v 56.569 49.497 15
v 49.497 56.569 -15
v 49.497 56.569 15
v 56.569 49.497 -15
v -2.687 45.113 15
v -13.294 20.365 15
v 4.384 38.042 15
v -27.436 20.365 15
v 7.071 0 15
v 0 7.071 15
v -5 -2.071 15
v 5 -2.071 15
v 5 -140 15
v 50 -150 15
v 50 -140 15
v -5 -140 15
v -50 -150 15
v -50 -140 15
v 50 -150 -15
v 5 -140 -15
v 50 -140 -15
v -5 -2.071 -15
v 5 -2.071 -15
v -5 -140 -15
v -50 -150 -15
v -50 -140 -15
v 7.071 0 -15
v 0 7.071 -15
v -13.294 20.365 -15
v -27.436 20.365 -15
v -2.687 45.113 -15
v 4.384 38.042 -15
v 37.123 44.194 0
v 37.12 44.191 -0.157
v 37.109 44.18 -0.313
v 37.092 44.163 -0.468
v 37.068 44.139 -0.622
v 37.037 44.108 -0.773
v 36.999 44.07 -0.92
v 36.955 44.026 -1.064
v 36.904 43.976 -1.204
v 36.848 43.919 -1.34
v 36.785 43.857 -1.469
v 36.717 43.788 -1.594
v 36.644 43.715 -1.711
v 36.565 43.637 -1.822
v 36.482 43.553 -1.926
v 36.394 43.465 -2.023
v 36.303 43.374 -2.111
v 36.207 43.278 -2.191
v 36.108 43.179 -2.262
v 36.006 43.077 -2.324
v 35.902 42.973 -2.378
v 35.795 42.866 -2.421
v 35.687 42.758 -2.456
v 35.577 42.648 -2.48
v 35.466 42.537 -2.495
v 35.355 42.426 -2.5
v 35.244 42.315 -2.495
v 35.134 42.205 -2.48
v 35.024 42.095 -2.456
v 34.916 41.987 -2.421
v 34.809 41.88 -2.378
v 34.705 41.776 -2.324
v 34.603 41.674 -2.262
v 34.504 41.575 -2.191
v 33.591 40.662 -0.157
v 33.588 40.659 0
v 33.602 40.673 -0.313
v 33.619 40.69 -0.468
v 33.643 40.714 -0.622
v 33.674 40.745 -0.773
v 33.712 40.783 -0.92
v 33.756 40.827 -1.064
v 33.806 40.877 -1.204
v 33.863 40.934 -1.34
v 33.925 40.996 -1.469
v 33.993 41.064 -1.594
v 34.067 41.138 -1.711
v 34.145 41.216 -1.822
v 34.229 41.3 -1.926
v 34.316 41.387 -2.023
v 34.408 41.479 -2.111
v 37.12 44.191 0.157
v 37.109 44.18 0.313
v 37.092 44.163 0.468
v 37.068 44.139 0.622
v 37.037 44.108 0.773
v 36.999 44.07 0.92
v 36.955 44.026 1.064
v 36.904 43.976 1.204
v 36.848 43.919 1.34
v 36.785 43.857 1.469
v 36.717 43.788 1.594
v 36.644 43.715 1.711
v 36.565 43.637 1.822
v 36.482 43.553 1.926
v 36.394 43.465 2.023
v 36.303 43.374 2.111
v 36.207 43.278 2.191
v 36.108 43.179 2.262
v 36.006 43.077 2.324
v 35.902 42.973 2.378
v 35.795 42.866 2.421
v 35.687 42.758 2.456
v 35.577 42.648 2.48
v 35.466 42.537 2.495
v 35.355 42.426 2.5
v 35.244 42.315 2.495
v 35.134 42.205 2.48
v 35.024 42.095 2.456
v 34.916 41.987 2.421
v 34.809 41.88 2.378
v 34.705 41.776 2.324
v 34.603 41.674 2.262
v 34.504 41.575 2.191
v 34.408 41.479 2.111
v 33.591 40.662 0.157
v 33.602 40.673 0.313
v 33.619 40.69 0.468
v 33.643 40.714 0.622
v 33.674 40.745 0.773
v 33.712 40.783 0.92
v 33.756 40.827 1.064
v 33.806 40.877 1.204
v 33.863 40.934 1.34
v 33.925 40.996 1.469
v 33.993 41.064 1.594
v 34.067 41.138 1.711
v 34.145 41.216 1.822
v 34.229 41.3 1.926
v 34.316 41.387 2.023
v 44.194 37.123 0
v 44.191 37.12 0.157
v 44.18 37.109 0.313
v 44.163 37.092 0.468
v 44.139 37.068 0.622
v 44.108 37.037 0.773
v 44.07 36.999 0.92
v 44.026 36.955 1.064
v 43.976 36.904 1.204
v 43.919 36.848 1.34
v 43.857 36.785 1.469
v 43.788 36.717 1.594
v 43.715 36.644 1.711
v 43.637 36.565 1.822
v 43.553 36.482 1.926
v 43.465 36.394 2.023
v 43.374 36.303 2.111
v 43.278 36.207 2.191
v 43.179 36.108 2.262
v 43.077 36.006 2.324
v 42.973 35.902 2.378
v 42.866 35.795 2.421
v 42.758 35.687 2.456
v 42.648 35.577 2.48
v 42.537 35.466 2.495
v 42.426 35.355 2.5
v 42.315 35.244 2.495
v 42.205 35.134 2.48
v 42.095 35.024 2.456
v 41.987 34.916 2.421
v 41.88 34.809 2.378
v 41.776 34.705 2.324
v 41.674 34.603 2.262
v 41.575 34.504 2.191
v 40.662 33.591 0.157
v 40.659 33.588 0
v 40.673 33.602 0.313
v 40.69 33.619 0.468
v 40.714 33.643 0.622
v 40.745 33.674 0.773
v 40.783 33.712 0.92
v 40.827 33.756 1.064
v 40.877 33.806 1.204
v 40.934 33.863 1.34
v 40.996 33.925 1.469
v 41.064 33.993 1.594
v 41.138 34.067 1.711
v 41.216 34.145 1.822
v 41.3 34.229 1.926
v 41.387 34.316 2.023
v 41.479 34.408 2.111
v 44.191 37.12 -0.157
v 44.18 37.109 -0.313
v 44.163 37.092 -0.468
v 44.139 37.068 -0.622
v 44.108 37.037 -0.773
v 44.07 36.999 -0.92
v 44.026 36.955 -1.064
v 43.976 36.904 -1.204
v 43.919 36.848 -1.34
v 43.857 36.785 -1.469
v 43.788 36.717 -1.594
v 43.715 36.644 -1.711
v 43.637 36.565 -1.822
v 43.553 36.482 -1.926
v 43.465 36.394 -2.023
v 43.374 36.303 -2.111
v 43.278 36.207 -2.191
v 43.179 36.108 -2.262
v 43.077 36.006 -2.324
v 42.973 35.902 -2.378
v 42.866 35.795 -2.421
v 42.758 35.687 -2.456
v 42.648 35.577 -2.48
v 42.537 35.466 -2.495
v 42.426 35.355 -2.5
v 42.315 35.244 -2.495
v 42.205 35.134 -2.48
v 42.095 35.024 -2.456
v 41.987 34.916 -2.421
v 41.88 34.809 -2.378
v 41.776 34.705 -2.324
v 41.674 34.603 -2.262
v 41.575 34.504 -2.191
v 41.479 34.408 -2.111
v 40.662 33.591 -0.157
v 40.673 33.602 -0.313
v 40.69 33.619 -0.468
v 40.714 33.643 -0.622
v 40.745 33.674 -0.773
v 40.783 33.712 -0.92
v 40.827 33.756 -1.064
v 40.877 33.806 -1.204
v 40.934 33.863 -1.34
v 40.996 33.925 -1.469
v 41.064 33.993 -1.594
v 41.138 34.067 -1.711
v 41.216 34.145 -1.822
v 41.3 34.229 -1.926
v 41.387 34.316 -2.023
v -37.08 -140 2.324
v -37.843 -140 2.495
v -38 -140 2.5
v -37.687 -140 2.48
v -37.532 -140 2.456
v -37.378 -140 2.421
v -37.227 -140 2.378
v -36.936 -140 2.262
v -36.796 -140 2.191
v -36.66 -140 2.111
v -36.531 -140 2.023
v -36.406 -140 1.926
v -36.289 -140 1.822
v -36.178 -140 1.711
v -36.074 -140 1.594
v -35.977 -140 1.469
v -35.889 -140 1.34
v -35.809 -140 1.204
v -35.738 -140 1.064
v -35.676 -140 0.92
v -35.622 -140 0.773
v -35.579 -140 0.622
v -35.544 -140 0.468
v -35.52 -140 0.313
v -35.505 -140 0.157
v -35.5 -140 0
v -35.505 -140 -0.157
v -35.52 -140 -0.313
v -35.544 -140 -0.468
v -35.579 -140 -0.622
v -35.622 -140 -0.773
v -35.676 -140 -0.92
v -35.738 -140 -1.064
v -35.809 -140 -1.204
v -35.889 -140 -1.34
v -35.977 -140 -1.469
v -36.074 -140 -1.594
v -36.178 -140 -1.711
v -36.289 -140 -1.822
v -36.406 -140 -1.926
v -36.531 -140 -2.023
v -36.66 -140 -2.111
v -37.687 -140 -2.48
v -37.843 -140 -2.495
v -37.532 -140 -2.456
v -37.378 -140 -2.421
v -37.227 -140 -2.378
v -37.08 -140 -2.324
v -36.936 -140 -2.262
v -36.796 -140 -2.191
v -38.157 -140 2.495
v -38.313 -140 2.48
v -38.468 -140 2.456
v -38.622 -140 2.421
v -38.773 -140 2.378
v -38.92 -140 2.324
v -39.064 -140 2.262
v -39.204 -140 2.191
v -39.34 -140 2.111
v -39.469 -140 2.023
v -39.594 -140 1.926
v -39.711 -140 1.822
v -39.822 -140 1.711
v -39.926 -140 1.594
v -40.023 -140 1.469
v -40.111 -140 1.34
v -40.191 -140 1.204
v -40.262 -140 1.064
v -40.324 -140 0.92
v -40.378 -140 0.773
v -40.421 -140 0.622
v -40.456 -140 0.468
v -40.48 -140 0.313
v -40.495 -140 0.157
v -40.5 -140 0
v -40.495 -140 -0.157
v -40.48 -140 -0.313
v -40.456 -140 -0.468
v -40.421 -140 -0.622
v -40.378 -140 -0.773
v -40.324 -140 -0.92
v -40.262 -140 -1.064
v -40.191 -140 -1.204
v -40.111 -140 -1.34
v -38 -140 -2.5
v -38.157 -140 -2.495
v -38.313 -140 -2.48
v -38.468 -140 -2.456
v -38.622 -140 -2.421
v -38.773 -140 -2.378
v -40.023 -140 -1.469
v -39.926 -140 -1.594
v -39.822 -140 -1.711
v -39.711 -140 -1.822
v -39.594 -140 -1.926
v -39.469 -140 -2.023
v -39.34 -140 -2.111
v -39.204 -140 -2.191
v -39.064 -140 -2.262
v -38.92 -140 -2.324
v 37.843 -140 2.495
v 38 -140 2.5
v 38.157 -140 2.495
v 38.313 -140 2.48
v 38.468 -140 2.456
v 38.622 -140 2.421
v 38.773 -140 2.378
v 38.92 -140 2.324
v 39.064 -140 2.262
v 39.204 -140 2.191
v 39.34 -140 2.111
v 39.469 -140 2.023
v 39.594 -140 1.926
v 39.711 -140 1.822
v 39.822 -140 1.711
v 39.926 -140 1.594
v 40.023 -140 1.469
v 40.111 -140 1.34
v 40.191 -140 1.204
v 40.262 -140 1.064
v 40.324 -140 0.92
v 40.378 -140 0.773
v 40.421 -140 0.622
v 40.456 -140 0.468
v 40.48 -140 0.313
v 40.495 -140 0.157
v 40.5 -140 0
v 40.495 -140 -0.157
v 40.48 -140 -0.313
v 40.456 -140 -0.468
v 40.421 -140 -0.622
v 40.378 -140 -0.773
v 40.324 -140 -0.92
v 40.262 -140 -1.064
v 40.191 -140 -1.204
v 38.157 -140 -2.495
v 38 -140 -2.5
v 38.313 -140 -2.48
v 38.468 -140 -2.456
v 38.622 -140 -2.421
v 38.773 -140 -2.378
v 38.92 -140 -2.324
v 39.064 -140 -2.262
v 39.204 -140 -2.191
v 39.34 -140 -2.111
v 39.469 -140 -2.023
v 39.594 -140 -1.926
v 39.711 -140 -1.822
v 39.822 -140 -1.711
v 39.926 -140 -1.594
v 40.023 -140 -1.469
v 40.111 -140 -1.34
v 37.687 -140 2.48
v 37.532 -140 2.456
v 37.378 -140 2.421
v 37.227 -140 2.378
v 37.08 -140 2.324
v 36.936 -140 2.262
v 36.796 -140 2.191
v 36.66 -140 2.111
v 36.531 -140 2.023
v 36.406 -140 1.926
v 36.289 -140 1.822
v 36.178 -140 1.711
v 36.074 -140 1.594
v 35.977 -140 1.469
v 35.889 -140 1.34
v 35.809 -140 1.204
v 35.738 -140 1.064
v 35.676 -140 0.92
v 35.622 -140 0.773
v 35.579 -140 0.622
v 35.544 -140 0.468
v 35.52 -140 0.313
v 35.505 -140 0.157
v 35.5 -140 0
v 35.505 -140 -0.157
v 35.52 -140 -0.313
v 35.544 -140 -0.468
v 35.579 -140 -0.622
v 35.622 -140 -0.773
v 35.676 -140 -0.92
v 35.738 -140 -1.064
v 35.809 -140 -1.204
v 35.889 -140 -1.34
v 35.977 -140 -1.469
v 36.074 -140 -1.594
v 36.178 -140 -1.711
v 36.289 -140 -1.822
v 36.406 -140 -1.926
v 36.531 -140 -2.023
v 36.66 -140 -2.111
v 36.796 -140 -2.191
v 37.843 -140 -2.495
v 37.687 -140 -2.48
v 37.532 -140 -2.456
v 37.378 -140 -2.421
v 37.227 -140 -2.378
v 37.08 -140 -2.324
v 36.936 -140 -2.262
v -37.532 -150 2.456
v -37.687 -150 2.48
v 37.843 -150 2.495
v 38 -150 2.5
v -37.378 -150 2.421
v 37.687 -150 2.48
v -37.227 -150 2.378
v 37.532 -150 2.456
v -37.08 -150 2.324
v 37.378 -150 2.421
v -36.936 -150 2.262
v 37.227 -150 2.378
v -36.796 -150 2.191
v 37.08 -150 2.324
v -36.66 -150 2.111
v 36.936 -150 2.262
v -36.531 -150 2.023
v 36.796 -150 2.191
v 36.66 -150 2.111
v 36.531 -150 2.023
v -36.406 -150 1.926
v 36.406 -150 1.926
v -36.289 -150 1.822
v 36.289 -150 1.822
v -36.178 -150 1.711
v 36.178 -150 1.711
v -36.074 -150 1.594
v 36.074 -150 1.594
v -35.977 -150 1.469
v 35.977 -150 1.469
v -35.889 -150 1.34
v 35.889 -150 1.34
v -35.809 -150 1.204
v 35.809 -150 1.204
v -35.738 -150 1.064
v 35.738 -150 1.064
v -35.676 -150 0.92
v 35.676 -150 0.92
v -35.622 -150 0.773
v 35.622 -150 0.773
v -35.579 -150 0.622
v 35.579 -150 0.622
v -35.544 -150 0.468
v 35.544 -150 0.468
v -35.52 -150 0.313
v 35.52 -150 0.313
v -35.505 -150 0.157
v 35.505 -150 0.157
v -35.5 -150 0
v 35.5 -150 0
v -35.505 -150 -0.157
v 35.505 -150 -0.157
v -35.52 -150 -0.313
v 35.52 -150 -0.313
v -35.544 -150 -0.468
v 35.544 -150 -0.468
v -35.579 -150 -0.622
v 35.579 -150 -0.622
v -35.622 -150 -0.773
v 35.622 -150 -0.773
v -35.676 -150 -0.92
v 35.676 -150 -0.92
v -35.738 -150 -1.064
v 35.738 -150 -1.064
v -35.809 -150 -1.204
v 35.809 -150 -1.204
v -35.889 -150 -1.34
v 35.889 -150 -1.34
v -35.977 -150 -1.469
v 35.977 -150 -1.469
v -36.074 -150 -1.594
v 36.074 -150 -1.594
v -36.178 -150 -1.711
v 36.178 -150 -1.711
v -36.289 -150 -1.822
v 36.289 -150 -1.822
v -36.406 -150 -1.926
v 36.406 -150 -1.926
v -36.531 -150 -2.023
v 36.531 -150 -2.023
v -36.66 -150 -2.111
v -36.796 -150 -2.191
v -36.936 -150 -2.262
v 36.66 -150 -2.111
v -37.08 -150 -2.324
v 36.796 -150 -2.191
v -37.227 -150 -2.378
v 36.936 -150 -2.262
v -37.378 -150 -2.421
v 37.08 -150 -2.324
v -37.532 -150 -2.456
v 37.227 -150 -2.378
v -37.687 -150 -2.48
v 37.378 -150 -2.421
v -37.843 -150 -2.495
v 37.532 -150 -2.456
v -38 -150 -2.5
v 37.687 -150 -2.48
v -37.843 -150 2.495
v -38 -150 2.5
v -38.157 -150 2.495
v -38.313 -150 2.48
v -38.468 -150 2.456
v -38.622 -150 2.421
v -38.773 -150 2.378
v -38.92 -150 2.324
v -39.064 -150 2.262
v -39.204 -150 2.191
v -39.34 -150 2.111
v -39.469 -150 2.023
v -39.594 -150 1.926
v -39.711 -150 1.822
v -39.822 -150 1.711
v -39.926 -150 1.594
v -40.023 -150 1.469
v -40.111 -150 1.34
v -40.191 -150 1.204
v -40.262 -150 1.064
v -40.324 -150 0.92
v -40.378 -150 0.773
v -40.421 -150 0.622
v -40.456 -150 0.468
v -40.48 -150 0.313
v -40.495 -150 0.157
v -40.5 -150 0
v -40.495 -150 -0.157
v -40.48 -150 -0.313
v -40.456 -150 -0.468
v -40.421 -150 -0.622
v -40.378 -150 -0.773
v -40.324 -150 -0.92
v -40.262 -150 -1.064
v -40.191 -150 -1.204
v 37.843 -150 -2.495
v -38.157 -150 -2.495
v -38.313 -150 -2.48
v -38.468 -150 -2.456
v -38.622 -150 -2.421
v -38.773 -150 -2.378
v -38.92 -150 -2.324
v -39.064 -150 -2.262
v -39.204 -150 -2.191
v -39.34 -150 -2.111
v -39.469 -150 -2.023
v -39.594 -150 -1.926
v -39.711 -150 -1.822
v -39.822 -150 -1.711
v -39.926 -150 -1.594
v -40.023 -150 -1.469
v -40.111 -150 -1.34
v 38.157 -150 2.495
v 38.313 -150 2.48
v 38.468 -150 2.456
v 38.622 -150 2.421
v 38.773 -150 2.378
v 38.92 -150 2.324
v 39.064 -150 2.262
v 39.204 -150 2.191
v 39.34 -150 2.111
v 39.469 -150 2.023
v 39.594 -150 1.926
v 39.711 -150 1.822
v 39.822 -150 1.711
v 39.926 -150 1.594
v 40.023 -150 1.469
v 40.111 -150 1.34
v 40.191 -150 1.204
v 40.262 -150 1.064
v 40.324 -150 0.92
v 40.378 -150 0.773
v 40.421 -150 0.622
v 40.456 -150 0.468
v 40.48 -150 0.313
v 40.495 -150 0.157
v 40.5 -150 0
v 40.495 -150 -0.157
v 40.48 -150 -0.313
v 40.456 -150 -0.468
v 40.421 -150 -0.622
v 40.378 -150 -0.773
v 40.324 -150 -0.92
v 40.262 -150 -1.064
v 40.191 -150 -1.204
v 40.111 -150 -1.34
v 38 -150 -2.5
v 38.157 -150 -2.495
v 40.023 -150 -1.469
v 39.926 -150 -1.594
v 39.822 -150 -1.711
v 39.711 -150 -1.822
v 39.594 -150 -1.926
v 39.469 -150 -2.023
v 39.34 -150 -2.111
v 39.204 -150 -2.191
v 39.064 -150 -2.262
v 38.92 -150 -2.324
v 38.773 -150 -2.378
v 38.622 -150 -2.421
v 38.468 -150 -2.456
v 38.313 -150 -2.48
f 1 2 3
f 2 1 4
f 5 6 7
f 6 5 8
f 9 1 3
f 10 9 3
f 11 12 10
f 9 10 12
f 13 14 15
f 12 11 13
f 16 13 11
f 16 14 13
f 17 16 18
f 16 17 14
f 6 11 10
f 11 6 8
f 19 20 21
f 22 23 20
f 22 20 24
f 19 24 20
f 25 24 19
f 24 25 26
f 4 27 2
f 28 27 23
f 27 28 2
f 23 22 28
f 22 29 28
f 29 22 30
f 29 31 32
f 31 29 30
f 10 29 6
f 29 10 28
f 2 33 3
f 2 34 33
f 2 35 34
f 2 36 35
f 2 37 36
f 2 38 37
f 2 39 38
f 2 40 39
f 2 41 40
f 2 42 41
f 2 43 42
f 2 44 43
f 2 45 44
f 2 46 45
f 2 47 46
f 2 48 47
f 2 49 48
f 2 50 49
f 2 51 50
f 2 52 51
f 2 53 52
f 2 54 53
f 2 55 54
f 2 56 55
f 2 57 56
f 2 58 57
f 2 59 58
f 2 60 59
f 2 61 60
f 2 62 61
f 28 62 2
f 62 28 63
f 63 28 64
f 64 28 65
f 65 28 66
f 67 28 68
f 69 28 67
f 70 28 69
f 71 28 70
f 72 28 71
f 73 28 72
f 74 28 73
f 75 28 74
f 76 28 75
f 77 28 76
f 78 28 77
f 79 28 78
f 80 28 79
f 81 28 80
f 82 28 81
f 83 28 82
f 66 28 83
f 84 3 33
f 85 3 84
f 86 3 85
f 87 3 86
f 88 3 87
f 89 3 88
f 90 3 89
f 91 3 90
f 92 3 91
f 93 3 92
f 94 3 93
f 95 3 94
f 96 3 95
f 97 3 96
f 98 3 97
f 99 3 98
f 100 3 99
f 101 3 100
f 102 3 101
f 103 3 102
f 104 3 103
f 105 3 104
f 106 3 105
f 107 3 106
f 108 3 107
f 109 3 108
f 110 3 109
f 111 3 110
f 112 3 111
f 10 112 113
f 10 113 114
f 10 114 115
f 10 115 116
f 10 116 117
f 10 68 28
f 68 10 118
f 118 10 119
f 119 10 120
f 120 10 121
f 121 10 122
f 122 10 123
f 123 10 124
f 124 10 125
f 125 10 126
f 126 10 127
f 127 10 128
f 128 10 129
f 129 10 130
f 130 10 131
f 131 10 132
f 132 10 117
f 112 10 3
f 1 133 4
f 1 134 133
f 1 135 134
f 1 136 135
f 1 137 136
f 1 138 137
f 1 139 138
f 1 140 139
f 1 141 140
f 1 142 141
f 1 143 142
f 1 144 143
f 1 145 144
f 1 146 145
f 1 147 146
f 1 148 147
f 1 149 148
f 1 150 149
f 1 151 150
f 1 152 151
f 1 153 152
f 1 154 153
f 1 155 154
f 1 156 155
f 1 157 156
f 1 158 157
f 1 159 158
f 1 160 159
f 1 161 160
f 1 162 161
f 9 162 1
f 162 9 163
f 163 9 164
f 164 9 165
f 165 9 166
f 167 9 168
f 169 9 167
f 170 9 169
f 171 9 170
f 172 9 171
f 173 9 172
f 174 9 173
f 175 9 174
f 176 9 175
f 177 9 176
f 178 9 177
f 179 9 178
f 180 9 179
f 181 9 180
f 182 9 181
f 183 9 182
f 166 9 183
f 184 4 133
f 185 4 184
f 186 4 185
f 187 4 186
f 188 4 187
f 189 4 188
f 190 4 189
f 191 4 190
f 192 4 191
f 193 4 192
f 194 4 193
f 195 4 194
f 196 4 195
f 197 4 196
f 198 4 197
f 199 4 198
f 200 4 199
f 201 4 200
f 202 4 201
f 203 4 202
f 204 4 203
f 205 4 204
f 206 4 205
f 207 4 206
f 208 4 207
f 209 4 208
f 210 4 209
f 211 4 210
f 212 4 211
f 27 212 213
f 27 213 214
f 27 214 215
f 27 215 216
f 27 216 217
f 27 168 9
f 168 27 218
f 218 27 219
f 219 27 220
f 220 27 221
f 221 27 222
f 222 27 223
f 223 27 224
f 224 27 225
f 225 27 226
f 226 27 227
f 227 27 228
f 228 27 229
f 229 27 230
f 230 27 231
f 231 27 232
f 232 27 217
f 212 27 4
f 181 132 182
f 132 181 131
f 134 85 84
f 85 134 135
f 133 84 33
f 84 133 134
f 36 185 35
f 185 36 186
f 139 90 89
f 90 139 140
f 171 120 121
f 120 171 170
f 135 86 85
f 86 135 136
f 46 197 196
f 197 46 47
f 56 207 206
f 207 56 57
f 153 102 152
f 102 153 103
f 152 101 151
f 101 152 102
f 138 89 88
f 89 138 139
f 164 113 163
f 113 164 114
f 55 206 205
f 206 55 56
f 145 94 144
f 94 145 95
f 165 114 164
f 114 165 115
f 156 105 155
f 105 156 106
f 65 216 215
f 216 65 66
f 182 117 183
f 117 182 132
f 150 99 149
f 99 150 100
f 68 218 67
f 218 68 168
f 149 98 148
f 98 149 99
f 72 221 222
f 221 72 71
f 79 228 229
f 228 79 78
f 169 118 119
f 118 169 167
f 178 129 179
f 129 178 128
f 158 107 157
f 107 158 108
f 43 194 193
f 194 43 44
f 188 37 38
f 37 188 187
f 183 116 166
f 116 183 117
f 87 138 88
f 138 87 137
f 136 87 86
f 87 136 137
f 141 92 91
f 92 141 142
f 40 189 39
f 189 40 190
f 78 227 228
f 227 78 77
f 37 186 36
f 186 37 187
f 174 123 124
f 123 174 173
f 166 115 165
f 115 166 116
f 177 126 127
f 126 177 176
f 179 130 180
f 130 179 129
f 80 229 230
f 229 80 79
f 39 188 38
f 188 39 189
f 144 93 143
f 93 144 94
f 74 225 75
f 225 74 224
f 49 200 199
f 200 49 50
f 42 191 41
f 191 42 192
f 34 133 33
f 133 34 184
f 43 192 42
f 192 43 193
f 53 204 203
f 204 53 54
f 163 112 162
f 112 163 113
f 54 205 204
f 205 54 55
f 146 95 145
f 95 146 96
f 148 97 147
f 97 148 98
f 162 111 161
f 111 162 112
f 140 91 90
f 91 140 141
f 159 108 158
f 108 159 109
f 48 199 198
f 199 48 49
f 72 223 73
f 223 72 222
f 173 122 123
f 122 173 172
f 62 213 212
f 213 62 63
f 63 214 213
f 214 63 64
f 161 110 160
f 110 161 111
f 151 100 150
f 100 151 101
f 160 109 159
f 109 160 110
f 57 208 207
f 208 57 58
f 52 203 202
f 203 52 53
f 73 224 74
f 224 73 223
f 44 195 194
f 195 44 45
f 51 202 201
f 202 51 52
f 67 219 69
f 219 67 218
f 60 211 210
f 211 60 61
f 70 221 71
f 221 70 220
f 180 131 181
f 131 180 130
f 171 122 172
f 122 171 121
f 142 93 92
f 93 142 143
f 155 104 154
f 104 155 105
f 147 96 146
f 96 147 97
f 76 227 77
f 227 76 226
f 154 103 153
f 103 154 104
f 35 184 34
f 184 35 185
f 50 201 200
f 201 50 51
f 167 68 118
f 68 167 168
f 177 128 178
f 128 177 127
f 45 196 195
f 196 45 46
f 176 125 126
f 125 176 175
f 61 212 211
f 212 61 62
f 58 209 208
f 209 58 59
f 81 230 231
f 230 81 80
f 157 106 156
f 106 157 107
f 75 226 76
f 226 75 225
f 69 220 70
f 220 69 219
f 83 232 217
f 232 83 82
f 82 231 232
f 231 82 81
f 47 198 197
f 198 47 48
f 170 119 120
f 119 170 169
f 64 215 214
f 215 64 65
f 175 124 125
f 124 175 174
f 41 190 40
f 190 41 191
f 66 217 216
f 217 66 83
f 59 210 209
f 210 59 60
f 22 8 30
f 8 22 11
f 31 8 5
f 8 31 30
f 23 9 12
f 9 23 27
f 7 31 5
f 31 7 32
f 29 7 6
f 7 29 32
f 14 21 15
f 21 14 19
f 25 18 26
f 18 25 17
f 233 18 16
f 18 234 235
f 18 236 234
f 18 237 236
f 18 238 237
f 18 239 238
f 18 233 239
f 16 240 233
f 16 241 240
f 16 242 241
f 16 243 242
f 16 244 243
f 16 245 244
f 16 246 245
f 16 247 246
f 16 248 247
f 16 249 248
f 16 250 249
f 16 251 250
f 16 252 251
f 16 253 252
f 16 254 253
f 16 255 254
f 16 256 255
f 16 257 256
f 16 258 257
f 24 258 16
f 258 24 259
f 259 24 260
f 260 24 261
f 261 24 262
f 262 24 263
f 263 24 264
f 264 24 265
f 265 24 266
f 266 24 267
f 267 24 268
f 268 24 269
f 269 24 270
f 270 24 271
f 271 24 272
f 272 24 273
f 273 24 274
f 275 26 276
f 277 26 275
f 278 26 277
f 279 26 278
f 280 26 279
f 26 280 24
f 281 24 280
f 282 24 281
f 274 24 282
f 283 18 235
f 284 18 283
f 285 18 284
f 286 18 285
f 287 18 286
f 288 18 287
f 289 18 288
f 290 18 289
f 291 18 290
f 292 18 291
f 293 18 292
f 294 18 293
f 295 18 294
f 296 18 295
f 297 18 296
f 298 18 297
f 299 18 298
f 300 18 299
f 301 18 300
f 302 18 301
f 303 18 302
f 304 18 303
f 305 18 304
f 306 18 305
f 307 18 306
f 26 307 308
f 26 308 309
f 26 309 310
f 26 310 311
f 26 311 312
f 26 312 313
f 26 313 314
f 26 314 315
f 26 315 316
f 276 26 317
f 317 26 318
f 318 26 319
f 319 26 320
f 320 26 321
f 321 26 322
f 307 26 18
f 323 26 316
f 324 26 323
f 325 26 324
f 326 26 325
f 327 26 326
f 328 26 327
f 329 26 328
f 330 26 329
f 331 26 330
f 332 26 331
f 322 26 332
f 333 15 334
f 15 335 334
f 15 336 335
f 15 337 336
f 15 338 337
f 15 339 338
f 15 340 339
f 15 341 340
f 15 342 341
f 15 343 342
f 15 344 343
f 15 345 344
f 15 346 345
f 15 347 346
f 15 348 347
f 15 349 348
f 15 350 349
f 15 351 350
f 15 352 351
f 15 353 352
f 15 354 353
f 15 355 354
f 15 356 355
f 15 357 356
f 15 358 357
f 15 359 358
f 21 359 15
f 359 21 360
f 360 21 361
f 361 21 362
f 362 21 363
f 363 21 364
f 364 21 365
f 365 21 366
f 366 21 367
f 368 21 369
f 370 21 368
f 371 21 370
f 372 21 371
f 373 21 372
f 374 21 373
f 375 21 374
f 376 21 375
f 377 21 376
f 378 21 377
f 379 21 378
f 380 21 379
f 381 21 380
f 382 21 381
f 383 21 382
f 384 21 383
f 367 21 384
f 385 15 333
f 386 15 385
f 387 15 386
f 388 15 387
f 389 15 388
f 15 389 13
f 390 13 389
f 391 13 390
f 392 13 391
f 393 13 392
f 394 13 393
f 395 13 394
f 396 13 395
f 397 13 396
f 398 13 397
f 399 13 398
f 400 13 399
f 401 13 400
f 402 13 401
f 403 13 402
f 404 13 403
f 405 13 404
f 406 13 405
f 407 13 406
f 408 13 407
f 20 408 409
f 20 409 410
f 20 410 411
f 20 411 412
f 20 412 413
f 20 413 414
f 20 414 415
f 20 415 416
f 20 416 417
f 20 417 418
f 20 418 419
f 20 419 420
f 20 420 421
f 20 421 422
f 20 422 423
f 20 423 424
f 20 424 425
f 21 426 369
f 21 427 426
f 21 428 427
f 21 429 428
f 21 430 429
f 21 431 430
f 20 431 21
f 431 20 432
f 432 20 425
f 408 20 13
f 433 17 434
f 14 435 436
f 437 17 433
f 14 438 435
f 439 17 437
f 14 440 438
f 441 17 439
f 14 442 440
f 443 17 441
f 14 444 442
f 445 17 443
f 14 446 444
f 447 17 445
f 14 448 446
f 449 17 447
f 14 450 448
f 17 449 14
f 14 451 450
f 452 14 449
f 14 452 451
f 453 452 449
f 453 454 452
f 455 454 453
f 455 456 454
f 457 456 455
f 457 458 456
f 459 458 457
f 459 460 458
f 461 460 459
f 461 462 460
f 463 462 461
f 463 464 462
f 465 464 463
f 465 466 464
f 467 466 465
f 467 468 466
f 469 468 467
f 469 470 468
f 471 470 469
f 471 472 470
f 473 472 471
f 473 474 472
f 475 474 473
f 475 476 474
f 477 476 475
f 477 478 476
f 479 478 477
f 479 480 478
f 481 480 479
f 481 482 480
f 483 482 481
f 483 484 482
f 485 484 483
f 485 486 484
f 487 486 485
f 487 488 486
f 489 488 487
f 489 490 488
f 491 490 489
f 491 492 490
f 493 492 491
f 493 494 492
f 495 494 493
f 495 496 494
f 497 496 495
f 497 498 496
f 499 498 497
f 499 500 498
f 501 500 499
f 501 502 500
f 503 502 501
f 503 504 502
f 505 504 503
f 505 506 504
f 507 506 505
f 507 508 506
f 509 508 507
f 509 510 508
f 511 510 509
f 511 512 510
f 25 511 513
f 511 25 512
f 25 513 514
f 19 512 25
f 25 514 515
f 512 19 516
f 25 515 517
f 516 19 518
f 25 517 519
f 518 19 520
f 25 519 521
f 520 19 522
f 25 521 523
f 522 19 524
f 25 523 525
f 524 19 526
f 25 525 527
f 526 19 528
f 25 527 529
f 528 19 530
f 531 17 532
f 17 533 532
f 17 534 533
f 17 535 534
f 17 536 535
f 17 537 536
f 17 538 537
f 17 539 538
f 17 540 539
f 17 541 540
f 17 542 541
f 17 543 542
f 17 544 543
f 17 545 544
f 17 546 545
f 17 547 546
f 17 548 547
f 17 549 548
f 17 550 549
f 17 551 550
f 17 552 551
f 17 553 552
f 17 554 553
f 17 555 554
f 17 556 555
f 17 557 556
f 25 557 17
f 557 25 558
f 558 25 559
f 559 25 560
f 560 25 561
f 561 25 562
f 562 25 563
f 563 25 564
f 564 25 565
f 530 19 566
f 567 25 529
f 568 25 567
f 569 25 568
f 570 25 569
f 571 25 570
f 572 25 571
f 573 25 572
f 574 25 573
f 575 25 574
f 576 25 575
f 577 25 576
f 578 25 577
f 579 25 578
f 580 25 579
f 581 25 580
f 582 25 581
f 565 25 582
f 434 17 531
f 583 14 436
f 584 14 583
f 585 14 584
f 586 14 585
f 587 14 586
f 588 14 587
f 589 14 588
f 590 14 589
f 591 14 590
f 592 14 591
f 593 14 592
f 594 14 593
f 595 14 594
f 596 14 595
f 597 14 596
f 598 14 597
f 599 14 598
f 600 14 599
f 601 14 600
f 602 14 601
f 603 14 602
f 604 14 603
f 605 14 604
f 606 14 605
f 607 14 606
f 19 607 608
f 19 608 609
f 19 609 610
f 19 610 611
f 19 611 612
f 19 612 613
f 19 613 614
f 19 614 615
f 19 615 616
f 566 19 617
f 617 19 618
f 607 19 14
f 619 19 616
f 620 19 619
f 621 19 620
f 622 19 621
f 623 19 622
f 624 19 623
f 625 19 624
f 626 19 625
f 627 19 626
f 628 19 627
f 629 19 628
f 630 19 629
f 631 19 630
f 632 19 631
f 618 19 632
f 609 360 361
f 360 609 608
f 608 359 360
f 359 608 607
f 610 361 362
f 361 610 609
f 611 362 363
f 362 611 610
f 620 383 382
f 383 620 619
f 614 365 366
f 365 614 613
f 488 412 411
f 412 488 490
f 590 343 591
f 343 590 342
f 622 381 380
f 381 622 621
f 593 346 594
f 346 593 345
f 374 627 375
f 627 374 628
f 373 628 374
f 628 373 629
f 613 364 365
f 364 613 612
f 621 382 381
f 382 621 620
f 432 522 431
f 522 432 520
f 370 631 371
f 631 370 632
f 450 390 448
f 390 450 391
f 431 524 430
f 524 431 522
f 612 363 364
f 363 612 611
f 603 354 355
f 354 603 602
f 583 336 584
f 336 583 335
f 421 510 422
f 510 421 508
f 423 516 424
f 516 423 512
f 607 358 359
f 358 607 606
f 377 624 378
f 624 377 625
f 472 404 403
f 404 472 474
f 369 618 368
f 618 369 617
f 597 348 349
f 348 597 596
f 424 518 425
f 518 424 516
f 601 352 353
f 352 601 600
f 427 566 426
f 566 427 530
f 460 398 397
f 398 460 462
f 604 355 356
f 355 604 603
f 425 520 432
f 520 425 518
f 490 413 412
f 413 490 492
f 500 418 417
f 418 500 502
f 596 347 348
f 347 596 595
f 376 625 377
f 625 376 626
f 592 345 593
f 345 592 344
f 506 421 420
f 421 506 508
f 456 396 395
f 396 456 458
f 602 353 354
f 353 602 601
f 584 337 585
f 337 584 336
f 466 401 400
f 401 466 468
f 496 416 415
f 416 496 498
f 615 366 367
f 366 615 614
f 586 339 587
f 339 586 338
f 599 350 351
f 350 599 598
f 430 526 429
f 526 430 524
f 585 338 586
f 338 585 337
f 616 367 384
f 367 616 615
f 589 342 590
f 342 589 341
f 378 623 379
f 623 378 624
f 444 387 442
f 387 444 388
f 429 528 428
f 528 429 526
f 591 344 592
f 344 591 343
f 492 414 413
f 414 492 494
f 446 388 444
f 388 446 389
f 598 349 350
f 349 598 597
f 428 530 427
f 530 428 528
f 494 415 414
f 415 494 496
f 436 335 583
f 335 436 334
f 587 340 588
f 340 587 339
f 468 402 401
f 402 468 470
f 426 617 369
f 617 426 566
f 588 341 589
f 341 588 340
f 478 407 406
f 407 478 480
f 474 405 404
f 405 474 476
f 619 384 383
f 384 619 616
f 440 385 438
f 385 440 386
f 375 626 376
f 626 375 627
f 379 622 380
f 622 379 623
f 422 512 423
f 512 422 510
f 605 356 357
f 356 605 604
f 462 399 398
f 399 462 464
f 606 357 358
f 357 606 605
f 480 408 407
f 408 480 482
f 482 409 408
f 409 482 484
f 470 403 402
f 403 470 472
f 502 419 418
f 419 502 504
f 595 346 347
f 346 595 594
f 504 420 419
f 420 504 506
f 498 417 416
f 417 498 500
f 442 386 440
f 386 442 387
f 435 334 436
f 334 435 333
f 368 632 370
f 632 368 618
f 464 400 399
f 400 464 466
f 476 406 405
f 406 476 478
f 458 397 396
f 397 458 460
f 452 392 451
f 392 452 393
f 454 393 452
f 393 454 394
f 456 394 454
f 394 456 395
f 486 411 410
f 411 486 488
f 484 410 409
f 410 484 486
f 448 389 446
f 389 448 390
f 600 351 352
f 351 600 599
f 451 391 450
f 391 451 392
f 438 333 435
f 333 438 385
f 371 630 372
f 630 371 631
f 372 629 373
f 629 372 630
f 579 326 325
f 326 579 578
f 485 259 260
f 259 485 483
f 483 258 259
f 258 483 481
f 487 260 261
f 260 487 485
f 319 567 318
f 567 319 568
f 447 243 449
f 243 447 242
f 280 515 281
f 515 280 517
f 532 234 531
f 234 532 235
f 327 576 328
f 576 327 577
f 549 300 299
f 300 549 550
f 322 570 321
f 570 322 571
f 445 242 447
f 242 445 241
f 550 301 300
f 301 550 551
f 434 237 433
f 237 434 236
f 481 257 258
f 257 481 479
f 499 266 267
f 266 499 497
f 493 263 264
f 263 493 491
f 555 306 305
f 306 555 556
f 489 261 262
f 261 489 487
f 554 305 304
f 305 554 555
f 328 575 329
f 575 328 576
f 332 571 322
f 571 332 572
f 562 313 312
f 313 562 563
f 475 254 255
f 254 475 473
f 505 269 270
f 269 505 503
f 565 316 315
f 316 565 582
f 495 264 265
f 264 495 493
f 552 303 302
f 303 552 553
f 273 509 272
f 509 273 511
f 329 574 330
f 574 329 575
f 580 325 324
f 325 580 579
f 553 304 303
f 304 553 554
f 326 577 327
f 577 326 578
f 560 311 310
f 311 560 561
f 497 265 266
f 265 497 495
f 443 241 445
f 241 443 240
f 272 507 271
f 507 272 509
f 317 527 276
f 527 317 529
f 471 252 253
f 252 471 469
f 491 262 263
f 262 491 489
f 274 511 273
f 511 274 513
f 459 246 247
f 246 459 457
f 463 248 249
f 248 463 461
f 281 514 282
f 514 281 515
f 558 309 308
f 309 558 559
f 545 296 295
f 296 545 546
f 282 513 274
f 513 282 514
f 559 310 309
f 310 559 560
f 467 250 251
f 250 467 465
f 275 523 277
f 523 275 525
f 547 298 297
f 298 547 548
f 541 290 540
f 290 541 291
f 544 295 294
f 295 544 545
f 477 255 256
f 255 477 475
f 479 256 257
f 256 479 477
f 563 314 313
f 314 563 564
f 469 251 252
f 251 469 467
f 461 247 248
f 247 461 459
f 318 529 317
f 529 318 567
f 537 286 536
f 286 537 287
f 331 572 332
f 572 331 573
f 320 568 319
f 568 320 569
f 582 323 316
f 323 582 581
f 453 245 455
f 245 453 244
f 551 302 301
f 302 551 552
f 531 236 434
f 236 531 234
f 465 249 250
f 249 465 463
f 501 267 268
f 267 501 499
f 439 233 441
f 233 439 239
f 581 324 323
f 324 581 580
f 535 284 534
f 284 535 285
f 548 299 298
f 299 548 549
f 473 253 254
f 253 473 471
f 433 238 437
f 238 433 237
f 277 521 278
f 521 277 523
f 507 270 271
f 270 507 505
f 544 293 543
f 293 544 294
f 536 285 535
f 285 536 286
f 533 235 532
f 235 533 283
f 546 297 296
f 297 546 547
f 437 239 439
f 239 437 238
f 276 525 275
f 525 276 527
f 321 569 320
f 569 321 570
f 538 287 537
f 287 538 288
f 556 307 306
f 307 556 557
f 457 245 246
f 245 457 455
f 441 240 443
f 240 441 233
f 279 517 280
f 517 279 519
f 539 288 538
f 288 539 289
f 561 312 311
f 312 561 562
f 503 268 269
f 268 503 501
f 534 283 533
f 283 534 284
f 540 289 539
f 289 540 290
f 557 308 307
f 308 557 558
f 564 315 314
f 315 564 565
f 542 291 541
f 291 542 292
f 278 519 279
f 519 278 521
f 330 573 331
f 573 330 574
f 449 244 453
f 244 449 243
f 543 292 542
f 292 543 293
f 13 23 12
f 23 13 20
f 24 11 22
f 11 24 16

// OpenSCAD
$fn=100;

wall_dist=150;
thickness=10;
width=80;
width2=100;
height=30;

screw_dia=4;
screw_dia2=5;
screw_head=8;
screw_offs=width/4*1.3;

screw_dist=76;

module screwhole()
{
  cylinder(d=screw_dia, h=thickness+1, center=true);
  translate([0, 0, thickness/2]) mirror([0, 0, 1]) cylinder(d2=0, d1=screw_head, h=screw_head*2/3, center=false);
}

module screwhole2()
{
  cylinder(d=screw_dia2, h=thickness+1, center=true);
  //translate([0, 0, thickness/2]) mirror([0, 0, 1]) cylinder(d2=0, d1=screw_head, h=screw_head*2/3, center=false);
}


//   FALI TARTO
//translate([0, -thickness/2], 0) difference()
//{
//  union()
//  {
//    cube([width, thickness, height], center=true);
//    translate([0, 0, width/2]) cube([height, thickness, width], center=true);
//  }
//  translate([screw_offs, 0, 0]) rotate([90, 0, 0]) screwhole();
//  translate([-screw_offs, 0, 0]) rotate([90, 0, 0]) screwhole();
//}

//   SZEKRENYHEZ ROGZITHETO
rotate([0, 0, 45])
{
  difference()
  {
    union()
    {
      translate([70/2+thickness/2, 0, 0]) cube([70, thickness, height], center=true);
      //translate([50/2+thickness/2, 0, 10]) cube([50, thickness, height], center=true);
      //cylinder(d=thickness, h=height, center=true);
    }
    translate([50+thickness/2, 0, 0]) rotate([90, 0, 0]) screwhole2();
  }
  translate([0, 18.8/2+thickness/2, 0]) cube([thickness, 18.8+thickness*2, height], center=true);
  translate([10+thickness/2, 18.8+thickness, 0]) cube([20+thickness, thickness, height], center=true);
}

translate([0, -wall_dist/2, 0]) cube([thickness, wall_dist, height], center=true);

translate([0, -wall_dist+thickness/2, 0]) difference()
{
  cube([width2, thickness, height], center=true);
  translate([screw_dist/2, 0, 0]) rotate([-90, 0, 0]) screwhole2();
  translate([-screw_dist/2, 0, 0]) rotate([-90, 0, 0]) screwhole2();
}
